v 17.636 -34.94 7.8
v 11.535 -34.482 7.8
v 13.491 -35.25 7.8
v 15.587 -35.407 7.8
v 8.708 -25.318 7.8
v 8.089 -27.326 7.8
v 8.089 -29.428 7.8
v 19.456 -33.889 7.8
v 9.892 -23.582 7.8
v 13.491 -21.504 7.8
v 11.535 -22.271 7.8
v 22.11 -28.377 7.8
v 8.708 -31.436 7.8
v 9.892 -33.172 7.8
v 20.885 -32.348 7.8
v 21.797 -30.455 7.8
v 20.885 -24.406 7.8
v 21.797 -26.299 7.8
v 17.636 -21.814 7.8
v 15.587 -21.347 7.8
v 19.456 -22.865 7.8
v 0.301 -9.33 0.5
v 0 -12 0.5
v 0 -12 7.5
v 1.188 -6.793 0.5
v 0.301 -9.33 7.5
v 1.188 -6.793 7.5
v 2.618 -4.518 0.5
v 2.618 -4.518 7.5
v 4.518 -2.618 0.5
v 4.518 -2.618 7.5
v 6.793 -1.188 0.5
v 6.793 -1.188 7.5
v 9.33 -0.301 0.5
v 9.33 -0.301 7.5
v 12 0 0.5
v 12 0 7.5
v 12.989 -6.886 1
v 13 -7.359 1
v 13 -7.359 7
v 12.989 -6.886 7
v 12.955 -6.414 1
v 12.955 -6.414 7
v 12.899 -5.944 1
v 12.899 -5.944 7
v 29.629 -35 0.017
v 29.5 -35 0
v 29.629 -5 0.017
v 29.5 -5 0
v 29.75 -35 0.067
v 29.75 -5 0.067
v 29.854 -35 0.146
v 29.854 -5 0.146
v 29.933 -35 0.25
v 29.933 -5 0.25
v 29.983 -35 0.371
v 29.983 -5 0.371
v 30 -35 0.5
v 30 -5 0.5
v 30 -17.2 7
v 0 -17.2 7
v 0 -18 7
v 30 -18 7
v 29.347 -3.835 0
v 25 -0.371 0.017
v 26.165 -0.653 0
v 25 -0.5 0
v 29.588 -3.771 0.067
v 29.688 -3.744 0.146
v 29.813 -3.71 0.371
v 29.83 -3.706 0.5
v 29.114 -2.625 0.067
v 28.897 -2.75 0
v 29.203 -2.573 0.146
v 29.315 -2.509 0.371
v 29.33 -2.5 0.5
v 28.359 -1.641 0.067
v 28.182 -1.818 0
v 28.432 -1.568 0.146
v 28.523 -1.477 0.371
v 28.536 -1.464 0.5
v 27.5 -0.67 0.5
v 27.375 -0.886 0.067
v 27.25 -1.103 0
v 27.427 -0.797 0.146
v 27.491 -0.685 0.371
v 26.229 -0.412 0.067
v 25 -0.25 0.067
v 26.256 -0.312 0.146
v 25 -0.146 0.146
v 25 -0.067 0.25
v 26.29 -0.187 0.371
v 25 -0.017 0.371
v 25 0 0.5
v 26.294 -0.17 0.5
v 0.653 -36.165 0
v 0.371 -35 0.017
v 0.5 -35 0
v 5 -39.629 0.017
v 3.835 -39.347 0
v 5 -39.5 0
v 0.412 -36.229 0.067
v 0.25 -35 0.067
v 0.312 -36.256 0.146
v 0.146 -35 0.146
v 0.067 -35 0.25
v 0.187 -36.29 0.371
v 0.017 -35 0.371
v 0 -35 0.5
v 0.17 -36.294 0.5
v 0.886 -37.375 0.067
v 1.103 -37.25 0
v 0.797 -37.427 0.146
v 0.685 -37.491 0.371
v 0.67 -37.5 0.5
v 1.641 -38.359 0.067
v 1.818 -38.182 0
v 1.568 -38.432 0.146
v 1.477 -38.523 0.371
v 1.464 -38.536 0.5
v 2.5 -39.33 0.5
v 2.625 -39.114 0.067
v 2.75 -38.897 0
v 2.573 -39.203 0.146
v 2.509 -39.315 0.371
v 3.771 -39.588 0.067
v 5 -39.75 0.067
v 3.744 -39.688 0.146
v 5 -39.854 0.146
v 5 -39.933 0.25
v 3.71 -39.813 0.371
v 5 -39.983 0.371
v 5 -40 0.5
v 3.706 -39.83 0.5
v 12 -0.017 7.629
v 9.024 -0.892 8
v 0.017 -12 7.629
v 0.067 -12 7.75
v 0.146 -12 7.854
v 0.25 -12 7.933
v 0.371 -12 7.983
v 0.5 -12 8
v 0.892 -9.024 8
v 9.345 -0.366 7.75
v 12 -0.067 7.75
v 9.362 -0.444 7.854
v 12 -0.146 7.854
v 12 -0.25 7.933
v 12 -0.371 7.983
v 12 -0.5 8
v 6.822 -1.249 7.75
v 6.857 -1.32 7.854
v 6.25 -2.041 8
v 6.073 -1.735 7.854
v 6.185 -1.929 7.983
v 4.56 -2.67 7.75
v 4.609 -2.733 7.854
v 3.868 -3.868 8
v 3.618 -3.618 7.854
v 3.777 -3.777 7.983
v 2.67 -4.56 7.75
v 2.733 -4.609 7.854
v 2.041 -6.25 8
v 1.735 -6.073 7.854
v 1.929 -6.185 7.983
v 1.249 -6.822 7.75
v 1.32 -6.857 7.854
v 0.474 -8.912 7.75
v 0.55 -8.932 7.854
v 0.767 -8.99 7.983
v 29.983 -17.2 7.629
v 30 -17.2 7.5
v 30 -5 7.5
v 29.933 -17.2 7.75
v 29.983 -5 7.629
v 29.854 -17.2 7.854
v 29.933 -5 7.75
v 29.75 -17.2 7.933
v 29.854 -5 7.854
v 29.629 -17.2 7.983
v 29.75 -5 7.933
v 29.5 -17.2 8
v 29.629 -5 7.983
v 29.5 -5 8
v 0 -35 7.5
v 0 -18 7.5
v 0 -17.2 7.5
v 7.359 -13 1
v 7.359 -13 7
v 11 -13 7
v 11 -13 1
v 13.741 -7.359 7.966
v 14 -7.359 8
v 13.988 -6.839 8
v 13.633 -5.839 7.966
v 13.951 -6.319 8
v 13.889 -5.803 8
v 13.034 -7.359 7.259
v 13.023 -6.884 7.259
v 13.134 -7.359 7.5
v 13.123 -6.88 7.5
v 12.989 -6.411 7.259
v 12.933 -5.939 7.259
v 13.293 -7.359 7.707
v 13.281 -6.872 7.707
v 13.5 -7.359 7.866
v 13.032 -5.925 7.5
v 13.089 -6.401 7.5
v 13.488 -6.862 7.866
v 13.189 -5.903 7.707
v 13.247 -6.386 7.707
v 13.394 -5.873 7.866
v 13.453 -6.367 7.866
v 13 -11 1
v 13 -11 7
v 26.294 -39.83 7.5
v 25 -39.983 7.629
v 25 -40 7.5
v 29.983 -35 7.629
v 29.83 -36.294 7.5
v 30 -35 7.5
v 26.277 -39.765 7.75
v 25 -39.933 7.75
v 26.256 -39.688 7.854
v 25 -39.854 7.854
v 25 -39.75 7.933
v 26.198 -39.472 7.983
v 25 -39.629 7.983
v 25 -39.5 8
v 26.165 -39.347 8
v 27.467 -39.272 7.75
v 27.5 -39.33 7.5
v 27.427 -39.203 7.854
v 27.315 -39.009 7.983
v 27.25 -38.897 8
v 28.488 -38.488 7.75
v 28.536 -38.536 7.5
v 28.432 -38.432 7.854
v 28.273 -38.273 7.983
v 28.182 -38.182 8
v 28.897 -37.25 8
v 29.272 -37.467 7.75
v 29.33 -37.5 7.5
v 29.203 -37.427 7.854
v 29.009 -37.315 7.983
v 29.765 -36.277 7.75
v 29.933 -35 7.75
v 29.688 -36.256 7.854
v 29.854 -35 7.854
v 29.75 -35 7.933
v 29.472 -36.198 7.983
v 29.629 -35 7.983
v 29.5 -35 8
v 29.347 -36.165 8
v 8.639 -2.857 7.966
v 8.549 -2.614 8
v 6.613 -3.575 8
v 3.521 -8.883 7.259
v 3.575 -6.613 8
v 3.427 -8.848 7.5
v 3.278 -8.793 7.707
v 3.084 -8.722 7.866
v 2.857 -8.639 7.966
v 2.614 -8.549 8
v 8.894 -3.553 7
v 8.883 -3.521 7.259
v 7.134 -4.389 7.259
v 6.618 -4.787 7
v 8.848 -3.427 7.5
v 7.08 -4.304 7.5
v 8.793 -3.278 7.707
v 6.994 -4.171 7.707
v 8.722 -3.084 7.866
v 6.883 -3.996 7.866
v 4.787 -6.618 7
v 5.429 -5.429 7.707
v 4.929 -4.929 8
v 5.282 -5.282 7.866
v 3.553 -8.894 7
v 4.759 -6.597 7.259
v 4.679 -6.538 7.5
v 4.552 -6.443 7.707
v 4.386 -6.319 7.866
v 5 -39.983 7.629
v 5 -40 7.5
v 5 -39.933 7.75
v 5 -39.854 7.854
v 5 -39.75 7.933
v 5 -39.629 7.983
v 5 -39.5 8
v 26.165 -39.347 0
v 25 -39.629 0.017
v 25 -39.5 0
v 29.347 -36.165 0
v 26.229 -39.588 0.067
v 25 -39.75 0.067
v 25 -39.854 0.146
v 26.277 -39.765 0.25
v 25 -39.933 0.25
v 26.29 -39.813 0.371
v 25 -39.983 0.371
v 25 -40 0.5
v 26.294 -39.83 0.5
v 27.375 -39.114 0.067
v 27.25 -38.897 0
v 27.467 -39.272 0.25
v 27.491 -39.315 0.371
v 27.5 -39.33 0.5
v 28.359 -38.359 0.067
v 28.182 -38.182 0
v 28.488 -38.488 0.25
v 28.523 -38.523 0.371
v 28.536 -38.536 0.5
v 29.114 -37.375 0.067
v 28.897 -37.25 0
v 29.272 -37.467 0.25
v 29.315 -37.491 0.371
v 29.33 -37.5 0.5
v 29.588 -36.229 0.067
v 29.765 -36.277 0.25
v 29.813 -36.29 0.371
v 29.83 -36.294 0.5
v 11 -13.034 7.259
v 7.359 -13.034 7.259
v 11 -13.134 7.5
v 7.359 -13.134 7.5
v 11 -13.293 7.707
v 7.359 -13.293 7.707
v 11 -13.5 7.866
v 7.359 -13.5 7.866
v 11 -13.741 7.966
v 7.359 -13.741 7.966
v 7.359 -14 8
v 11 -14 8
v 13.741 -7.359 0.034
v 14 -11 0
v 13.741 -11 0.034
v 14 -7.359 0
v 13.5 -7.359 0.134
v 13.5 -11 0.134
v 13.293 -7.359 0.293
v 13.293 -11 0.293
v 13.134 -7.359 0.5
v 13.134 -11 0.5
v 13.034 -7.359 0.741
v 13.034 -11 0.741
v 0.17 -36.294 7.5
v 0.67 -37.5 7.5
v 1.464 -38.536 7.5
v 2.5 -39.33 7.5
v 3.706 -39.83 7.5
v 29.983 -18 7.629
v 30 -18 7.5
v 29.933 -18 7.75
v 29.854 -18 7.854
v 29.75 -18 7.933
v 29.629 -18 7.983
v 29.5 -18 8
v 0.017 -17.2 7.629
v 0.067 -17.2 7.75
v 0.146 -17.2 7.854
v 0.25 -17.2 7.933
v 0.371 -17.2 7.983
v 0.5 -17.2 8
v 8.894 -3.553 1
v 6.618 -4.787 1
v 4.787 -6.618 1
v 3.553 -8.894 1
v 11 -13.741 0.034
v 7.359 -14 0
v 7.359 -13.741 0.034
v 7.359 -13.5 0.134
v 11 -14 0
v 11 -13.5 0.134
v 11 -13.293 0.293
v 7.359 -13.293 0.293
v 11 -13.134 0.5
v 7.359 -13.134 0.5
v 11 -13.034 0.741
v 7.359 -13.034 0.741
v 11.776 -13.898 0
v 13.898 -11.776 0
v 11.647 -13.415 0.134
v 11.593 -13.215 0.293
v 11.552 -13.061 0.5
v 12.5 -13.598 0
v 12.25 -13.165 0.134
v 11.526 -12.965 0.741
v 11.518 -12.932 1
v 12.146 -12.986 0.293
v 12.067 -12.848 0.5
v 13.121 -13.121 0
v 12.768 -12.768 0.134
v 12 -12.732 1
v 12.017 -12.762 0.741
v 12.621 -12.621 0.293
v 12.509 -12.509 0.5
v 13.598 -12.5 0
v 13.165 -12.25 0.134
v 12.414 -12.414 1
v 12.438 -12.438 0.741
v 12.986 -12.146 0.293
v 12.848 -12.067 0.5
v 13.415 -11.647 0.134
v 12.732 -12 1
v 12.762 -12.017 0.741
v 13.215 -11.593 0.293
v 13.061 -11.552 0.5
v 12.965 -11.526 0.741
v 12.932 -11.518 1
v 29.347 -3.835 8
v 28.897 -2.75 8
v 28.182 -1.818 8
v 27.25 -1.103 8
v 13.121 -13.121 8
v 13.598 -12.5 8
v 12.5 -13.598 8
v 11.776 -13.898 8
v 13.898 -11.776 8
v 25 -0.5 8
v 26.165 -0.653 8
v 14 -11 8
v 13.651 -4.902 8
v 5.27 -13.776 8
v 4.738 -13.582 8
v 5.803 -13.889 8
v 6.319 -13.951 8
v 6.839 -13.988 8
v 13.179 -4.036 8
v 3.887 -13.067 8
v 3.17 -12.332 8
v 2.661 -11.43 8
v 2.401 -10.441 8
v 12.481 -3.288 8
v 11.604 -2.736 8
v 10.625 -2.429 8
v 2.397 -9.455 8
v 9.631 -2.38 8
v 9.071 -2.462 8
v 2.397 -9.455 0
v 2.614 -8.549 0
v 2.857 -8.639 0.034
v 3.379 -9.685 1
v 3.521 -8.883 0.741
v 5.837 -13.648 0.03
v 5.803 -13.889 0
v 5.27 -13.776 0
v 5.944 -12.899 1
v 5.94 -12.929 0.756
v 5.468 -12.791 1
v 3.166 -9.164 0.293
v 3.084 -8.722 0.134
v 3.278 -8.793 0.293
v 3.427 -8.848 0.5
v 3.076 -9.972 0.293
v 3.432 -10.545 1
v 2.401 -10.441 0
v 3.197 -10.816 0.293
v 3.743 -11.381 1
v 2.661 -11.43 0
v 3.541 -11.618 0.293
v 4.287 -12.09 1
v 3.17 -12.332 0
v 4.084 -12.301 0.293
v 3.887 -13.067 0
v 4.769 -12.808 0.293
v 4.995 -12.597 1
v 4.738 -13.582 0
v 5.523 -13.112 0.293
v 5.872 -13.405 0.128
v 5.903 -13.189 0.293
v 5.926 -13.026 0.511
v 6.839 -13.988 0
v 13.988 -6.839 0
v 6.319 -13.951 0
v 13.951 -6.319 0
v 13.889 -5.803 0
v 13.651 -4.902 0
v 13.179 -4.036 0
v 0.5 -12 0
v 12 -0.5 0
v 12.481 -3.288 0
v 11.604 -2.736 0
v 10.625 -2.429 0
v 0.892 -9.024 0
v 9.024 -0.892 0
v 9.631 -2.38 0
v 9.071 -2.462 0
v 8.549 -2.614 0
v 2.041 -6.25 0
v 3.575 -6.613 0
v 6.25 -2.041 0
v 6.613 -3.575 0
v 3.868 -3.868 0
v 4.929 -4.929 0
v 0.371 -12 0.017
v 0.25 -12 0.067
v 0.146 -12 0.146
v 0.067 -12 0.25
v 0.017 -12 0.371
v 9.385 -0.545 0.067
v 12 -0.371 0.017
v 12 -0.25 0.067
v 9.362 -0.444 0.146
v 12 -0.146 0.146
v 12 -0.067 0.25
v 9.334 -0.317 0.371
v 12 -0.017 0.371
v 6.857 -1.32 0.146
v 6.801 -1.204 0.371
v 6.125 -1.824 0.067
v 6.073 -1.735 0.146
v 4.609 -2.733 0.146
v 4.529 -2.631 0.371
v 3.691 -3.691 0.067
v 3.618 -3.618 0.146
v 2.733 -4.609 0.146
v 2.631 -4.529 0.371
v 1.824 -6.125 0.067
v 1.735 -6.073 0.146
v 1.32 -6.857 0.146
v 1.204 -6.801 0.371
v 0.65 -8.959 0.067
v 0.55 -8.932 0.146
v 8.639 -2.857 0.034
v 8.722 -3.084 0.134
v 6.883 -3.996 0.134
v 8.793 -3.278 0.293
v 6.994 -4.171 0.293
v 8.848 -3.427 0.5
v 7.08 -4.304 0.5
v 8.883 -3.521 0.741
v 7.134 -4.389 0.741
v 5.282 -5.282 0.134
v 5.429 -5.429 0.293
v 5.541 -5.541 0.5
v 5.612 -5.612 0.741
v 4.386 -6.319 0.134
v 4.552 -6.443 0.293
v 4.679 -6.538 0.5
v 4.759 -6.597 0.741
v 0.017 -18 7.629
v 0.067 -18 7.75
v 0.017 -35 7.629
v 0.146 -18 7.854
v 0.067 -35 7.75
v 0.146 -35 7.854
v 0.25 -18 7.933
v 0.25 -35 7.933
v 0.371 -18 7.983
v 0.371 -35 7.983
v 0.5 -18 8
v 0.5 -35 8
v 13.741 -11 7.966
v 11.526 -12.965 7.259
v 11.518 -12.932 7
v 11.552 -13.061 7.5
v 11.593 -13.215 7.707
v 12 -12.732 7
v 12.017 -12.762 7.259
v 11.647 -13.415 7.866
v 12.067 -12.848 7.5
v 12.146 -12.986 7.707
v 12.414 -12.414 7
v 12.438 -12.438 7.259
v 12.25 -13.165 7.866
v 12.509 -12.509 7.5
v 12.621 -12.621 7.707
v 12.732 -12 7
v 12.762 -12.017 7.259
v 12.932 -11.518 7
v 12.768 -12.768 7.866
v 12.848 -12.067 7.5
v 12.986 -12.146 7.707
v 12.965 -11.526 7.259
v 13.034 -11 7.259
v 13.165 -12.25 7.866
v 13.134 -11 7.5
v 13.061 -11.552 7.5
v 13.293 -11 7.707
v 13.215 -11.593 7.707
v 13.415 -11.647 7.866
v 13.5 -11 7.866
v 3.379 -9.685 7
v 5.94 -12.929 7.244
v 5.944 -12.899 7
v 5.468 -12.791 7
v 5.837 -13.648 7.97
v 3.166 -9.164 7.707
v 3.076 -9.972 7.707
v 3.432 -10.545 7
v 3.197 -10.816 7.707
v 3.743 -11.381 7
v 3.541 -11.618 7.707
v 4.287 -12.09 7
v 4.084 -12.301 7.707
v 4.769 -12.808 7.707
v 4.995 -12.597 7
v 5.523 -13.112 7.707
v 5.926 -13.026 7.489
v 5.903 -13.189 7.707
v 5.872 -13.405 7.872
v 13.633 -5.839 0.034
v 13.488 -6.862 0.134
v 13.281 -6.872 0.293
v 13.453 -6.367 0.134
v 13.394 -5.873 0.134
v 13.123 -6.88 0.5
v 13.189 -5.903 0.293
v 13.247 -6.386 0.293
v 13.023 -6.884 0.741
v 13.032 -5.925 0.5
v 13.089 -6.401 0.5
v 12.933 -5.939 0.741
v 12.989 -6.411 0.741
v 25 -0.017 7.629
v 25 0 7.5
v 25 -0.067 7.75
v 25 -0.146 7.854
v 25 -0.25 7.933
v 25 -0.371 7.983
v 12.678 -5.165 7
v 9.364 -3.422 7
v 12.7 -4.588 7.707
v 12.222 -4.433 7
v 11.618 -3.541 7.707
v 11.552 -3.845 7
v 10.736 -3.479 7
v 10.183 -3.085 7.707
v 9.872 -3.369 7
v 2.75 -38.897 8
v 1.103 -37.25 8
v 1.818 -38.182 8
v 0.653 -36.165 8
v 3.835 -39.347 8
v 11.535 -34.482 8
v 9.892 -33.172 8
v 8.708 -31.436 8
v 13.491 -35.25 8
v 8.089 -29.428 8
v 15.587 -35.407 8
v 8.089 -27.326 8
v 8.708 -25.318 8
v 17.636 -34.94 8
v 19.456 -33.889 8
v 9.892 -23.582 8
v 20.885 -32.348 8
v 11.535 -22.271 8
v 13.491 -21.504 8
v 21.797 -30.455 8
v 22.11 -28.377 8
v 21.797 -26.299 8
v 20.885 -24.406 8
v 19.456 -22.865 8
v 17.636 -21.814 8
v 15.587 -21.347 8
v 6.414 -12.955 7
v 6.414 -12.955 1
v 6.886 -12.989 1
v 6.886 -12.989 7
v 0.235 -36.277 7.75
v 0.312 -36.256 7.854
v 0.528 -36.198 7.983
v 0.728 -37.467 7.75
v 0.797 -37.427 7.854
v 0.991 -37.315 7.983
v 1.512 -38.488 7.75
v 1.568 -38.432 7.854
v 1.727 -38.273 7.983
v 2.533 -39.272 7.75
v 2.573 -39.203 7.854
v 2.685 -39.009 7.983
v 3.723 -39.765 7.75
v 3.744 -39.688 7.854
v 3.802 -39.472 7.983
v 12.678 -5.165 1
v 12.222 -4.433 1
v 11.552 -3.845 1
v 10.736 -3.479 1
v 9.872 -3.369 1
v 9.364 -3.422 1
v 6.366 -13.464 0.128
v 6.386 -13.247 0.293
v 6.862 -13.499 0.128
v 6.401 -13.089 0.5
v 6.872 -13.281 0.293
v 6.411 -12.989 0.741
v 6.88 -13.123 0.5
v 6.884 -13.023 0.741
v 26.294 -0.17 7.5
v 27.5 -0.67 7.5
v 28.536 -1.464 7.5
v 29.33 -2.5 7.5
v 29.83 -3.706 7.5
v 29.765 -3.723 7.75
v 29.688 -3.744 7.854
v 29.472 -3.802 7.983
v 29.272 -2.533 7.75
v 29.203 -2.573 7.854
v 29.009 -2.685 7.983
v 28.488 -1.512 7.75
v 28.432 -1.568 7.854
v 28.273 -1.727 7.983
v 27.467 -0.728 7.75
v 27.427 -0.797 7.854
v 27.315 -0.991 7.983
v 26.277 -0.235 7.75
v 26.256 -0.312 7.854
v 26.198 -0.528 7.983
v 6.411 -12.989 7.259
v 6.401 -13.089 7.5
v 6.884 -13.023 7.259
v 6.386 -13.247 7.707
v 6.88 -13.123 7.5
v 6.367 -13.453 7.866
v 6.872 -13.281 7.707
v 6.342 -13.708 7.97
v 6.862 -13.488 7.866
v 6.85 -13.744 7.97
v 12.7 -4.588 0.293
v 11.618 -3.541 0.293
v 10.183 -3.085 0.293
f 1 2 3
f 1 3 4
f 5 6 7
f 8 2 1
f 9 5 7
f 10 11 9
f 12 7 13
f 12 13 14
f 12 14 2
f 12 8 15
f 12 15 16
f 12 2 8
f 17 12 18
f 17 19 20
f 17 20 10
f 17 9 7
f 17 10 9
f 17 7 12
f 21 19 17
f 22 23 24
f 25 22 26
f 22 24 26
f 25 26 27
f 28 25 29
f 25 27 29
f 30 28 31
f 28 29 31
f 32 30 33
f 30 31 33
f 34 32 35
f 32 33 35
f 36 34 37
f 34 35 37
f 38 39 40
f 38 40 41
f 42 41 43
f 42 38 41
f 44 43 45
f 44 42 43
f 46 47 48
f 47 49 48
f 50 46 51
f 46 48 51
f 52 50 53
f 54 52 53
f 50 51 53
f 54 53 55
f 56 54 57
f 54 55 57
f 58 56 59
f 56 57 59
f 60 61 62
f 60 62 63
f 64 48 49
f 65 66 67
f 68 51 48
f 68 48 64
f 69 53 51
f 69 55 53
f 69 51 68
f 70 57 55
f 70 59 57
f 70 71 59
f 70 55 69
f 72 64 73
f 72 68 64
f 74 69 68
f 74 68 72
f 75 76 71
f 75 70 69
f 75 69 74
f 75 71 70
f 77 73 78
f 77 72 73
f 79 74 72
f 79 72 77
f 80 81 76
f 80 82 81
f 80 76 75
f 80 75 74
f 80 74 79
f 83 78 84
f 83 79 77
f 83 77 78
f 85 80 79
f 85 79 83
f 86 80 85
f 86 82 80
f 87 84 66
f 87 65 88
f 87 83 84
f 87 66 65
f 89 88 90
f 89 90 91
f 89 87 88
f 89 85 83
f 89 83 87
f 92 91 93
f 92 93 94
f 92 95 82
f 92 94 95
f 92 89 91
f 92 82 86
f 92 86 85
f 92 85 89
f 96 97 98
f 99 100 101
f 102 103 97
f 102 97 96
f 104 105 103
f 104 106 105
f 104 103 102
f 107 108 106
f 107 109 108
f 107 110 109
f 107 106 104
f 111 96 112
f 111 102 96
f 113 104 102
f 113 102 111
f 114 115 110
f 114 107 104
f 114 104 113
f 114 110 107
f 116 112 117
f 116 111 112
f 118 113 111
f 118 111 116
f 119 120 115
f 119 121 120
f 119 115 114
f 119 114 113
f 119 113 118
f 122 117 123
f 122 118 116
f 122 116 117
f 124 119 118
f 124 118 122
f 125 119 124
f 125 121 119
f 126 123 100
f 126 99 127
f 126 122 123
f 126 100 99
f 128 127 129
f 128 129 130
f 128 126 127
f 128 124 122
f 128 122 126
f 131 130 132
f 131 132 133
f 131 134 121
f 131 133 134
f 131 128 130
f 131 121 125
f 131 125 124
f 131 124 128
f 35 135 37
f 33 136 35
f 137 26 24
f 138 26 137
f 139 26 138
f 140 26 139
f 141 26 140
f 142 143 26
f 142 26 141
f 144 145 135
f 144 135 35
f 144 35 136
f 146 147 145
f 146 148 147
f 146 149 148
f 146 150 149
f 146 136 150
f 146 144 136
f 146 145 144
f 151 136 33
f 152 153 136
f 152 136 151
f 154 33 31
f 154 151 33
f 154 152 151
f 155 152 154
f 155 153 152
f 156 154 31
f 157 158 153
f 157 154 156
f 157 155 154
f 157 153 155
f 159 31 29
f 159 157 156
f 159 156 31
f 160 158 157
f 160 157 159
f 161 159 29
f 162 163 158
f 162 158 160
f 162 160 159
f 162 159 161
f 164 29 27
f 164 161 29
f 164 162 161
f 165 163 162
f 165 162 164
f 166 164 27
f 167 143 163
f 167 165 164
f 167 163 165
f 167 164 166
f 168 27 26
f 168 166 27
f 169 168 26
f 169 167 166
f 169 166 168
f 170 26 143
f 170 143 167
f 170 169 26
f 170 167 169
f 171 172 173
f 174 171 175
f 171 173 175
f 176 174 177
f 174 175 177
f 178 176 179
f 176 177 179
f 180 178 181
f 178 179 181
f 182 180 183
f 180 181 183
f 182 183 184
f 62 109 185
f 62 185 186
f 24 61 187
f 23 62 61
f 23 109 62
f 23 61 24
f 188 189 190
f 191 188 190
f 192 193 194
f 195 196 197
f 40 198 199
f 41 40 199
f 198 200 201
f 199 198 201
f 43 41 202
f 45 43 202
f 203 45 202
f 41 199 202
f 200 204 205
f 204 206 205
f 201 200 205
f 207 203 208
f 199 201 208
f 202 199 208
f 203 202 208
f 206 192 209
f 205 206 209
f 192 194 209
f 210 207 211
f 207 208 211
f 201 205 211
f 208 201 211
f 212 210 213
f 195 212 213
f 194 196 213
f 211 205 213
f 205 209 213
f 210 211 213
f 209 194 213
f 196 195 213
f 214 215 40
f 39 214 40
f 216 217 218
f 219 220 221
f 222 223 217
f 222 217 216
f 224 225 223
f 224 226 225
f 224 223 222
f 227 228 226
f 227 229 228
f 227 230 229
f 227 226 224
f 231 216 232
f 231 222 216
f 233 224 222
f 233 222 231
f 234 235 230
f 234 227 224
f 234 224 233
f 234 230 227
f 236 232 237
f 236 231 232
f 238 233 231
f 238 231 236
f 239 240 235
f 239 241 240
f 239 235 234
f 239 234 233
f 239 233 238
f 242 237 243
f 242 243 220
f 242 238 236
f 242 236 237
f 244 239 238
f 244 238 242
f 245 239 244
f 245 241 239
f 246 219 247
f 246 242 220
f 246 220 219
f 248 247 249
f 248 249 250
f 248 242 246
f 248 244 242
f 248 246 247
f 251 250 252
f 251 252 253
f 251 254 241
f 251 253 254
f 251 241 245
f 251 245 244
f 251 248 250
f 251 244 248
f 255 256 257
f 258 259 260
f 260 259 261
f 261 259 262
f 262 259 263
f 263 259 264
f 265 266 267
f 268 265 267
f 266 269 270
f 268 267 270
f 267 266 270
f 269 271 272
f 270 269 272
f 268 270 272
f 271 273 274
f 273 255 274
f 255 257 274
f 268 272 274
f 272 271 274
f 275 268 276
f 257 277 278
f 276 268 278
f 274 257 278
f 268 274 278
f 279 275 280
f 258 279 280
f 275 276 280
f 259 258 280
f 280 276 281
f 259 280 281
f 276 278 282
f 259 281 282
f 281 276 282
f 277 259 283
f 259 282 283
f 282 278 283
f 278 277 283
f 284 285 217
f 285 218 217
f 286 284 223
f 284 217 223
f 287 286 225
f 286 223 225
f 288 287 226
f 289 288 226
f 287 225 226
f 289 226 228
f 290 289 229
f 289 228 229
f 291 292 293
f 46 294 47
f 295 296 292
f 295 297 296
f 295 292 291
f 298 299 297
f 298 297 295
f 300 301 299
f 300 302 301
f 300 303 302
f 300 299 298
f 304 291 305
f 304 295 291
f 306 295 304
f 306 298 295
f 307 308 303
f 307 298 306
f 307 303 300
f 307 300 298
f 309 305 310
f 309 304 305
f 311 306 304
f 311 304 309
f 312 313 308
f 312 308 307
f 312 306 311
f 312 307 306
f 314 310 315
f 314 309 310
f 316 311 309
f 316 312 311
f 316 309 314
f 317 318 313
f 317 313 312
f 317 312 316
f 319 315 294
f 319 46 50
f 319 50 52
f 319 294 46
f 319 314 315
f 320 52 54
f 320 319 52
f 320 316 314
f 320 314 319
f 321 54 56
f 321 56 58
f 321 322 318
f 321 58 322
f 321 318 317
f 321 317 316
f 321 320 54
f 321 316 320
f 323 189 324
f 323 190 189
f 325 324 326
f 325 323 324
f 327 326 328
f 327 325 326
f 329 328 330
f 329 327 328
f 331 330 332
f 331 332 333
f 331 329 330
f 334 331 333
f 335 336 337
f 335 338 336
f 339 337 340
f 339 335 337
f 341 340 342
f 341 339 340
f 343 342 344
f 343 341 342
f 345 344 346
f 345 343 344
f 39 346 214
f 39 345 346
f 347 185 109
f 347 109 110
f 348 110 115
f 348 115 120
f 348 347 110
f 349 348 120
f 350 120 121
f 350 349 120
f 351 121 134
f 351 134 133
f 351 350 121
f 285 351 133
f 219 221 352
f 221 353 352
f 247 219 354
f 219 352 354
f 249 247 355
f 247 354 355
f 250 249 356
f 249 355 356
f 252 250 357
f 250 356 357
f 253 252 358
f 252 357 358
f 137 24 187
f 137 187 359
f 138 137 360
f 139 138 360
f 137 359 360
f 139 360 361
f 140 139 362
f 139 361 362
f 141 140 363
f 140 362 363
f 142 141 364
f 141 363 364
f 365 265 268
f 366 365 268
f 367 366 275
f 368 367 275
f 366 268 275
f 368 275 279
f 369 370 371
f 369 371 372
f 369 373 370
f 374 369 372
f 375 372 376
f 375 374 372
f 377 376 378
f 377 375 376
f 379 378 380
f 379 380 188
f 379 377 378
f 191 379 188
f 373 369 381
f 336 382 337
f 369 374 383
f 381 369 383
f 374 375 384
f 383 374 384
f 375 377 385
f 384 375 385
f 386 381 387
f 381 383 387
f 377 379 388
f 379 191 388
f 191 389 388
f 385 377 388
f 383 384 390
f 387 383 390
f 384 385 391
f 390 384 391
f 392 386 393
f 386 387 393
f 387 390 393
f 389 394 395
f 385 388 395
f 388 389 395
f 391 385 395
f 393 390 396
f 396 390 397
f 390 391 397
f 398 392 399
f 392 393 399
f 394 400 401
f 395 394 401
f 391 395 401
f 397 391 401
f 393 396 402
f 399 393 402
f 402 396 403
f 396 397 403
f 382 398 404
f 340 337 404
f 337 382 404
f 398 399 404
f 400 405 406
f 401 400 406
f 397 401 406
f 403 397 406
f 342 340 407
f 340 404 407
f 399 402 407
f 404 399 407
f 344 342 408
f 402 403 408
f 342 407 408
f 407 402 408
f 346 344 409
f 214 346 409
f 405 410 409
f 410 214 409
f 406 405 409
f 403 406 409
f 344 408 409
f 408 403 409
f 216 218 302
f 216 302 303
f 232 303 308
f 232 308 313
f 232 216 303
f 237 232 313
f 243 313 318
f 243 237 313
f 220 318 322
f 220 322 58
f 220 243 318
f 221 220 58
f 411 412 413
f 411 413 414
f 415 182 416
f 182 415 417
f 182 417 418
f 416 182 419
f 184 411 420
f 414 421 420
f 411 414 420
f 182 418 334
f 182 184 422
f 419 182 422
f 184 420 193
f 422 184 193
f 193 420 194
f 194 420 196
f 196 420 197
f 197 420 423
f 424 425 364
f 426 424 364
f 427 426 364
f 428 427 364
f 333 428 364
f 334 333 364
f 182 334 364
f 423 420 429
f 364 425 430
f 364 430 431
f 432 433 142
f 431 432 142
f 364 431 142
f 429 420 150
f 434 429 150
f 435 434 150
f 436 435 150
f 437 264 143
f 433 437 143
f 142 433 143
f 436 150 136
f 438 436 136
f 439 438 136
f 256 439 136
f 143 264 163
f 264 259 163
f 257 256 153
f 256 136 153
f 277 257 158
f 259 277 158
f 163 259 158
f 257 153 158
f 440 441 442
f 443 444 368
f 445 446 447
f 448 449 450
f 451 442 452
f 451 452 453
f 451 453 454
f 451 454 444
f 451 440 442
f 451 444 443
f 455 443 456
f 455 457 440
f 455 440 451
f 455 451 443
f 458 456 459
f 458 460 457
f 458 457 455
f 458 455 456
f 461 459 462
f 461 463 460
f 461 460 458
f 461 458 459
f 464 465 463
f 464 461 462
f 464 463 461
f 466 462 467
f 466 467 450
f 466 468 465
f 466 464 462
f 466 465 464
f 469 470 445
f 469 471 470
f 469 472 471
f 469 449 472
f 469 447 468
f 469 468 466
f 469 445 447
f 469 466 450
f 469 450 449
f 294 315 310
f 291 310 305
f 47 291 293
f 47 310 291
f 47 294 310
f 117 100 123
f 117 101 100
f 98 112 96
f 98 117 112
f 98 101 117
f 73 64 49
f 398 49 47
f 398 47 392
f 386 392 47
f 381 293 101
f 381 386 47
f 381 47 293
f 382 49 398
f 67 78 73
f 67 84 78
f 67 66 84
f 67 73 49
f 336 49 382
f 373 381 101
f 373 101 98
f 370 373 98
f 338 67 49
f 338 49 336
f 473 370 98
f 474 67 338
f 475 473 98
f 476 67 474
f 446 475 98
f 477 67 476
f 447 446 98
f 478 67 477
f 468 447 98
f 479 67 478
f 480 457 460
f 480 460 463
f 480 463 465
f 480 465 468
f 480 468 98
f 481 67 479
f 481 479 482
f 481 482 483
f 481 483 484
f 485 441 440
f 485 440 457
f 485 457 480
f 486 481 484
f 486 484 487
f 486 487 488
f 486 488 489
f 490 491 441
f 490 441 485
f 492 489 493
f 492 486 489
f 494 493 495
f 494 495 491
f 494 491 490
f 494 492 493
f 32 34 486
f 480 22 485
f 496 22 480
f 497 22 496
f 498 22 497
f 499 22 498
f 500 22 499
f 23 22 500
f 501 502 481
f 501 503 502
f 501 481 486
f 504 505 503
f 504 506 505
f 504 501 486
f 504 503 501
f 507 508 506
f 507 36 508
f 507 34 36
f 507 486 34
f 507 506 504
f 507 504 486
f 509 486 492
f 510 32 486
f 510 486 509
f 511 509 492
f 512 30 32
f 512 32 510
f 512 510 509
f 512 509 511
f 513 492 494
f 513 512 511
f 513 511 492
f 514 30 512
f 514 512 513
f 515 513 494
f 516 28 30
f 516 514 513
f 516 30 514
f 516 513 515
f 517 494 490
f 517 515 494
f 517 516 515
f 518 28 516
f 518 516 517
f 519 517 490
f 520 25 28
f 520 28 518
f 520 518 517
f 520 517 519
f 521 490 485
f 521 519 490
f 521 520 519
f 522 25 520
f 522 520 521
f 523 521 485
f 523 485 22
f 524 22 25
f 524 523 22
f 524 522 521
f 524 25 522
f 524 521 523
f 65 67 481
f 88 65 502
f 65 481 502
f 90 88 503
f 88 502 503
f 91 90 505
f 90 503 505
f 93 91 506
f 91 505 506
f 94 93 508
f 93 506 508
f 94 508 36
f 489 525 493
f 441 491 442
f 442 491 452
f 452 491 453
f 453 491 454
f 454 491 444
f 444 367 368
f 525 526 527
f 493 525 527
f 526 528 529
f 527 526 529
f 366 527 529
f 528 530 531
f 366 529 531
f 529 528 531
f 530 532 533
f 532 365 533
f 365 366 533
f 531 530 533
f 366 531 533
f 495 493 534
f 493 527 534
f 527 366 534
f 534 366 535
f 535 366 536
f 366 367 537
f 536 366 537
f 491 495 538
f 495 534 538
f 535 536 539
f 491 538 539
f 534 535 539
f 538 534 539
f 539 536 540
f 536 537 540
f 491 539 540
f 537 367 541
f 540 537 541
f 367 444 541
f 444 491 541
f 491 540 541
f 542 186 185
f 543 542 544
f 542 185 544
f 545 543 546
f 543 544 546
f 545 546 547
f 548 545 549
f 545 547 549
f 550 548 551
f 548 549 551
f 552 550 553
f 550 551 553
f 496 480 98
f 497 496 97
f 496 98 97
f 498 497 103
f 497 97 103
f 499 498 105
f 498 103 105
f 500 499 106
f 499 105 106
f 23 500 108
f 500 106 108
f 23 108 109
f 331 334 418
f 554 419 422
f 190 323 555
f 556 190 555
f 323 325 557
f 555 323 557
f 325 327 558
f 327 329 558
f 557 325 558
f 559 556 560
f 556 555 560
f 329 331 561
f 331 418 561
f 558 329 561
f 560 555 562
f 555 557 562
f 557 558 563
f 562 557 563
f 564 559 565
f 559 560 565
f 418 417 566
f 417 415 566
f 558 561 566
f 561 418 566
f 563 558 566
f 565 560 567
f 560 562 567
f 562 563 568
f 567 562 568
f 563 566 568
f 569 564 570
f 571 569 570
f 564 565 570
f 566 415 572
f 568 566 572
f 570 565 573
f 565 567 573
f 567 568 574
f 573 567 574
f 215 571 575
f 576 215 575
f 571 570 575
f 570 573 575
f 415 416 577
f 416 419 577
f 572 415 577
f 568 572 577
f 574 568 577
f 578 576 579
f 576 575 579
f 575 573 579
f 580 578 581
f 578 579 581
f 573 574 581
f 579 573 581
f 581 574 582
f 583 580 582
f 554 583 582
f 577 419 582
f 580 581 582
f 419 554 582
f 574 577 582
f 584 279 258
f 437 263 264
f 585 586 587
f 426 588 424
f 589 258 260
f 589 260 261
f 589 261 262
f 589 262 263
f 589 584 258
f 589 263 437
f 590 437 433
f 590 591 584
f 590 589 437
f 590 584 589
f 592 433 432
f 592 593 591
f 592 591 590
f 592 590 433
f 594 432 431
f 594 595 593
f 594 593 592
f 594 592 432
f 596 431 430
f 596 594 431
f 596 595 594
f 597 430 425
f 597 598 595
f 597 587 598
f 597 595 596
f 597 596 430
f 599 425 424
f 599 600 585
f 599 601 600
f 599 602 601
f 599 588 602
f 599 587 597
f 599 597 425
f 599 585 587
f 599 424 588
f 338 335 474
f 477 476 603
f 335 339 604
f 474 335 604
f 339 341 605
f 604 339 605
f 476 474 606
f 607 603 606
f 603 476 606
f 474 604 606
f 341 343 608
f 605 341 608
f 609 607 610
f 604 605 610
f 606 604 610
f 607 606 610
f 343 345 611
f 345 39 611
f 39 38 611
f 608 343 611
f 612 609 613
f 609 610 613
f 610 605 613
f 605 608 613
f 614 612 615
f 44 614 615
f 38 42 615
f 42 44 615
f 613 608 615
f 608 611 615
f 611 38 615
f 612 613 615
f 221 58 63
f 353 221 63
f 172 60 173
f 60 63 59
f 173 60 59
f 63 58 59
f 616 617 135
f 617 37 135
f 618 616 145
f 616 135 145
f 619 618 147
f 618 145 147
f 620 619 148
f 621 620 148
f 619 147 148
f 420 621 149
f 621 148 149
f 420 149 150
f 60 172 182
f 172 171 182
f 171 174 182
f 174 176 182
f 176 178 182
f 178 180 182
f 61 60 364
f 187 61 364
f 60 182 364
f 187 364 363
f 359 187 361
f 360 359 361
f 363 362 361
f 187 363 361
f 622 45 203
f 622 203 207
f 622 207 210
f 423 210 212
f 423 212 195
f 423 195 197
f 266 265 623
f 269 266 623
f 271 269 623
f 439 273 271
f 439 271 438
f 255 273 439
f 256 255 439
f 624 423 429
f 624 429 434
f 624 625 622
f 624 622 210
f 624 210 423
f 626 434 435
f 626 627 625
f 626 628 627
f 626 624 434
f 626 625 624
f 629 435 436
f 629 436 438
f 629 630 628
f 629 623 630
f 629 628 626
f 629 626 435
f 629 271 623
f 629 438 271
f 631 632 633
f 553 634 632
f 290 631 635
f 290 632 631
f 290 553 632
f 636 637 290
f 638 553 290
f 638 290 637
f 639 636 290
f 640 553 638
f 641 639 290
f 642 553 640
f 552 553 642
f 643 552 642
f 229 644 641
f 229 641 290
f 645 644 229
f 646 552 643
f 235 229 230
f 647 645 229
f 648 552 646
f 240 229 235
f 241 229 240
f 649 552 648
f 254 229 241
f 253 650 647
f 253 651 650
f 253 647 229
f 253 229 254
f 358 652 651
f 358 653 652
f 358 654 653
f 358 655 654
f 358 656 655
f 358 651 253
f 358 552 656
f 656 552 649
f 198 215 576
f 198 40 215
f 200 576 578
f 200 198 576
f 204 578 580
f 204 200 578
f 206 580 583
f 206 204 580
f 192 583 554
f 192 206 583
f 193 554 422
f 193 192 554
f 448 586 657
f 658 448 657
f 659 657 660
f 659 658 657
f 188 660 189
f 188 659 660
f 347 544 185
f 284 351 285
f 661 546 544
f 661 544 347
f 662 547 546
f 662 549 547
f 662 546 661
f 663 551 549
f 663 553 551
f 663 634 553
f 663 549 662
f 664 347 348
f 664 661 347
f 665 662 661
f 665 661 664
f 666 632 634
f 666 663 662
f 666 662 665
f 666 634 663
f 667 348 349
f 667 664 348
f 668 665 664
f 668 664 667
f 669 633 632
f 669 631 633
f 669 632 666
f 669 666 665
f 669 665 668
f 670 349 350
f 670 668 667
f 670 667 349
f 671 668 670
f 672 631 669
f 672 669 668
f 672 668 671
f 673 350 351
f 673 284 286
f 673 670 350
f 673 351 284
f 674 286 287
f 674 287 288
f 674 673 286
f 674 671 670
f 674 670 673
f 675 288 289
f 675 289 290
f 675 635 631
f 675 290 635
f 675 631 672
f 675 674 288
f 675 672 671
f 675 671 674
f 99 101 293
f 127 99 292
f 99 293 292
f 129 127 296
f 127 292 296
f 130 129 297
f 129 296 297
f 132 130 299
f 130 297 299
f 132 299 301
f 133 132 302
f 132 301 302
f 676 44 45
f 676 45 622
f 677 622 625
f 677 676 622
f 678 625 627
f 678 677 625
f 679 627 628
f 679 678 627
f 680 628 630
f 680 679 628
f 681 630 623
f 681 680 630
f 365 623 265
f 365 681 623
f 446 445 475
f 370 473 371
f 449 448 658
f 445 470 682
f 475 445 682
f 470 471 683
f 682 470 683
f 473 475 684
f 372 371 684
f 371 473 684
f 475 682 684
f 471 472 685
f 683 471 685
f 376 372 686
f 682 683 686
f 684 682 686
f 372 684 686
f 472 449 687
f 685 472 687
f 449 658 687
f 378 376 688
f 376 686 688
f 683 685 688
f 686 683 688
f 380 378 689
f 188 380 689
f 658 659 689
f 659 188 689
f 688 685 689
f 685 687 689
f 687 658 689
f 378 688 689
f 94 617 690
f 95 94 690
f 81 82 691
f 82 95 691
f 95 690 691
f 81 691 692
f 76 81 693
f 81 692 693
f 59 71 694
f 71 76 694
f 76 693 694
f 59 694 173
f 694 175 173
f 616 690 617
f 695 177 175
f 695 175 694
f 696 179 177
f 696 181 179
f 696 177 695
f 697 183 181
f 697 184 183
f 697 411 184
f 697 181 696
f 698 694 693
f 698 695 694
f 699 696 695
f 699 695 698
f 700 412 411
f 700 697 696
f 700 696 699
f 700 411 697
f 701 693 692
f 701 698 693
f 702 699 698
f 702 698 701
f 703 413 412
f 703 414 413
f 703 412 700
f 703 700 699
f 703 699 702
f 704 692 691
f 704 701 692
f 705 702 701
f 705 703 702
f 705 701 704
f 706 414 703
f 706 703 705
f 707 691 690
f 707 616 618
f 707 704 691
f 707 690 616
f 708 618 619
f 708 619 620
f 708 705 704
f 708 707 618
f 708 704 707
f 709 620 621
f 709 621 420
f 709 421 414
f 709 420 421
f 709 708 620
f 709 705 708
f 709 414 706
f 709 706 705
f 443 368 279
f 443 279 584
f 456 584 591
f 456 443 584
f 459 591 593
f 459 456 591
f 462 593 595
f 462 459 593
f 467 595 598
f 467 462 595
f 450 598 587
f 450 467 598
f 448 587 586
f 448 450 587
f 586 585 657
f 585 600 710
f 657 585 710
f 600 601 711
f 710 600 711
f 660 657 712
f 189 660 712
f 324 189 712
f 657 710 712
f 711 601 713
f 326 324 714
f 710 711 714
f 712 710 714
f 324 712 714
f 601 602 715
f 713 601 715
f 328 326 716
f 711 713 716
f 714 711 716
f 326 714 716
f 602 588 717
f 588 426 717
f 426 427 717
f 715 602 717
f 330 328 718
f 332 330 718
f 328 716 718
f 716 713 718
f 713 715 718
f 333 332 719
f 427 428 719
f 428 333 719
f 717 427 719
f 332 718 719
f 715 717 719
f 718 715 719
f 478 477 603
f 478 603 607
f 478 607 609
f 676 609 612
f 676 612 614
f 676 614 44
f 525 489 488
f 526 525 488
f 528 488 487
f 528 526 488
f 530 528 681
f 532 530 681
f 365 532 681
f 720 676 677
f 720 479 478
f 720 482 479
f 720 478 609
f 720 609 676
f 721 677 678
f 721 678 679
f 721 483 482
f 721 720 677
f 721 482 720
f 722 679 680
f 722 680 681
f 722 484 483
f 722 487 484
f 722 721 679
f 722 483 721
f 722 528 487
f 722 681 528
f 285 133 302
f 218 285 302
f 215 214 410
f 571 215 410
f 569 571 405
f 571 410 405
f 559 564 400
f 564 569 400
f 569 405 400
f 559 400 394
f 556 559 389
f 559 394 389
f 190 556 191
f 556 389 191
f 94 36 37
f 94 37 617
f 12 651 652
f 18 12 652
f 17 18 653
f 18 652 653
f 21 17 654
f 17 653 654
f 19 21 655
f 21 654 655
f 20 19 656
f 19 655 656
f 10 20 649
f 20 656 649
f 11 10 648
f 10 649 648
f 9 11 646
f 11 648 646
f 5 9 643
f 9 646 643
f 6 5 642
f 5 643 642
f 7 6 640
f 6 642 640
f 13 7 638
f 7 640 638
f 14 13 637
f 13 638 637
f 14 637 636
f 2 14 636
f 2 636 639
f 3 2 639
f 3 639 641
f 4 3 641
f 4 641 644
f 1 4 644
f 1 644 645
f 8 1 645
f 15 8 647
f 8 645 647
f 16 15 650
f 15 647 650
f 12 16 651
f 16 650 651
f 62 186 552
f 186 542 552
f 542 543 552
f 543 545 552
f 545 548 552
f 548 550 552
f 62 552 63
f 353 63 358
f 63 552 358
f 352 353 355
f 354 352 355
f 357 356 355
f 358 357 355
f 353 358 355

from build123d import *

# Parameters (mm, degrees)
F0_W        = 30
F0_H        = 40
F1_DEPTH    = 8
F2_R        = 12
F3_R        = 5
F5_DEPTH    = 25
F4_W        = 26.9999996879
F4_H        = 0.8
F4_W_2      = 3.0000003121
F6_DEPTH    = 1
F7_T1_DEPTH = 8
F8_R        = 3
F9_R        = 2
F10_R       = 0.5
F11_R       = 1
F12_R       = 7.0500114294
F13_DEPTH   = 0.2


# Not quite as in the source:
# - a fillet or chamfer that OpenCascade refuses, or shapes differently, is made with other operations: its cross-section is extruded or revolved along the edge and cut away or added


with BuildPart() as f1:
    # F0 (on Top) → F1 (new body)
    with BuildSketch(Plane.XY):
        with Locations((15, -20)):
            Rectangle(F0_W, F0_H)
    extrude(amount=F1_DEPTH)

    # F2
    f2_edges = [f1.edges().sort_by_distance(p)[0] for p in [
        (0, 0, 4),
    ]]
    fillet(f2_edges, radius=F2_R)

    # F3
    f3_edges = [f1.edges().sort_by_distance(p)[0] for p in [
        (30, 0, 4),
        (30, -40, 4),
        (0, -40, 4),
    ]]
    fillet(f3_edges, radius=F3_R)

    # F4 (on face) → F5 (cut)
    with BuildSketch(Plane.XY.offset(8)):
        with BuildLine():
            Line((3.0000003121, -12), (3.0000003121, -13.0000003121))
            Line((3.0000003121, -13.0000003121), (13.0000003121, -13.0000003121))
            Line((13.0000003121, -13.0000003121), (13.0000003121, -3.0000003121))
            Line((13.0000003121, -3.0000003121), (12, -3.0000003121))
            ThreePointArc((12, -3.0000003121), (5.63603919, -5.63603919), (3.0000003121, -12))
        make_face()
    extrude(amount=-F5_DEPTH, mode=Mode.SUBTRACT)

    # F4 (on face) → F6 (cut)
    with BuildSketch(Plane.XY.offset(8)):
        with Locations((16.500000156, -17.6)):
            Rectangle(F4_W, F4_H)
        with Locations((1.500000156, -17.6)):
            Rectangle(F4_W_2, F4_H)
    extrude(amount=-F6_DEPTH, mode=Mode.SUBTRACT)

    # F7: fillet of radius 10 on 2 edges, made by hand

    # F7_s2 → F7_t1 (join)
    with BuildSketch(Plane.XY):
        with BuildLine():
            ThreePointArc((13.0000003121, -7.3588999), (12.7467945768, -5.1228315736), (12, -3.0000003121))
            Line((12, -3.0000003121), (13.0000003121, -3.0000003121))
            Line((13.0000003121, -3.0000003121), (13.0000003121, -7.3588999))
        make_face()
        with BuildLine():
            ThreePointArc((3.0000003121, -12), (5.1228315736, -12.7467945768), (7.3588999, -13.0000003121))
            Line((7.3588999, -13.0000003121), (3.0000003121, -13.0000003121))
            Line((3.0000003121, -13.0000003121), (3.0000003121, -12))
        make_face()
    extrude(amount=F7_T1_DEPTH)

    # F8
    f8_edges = [f1.edges().sort_by_distance(p)[0] for p in [
        (12, -3, 4),
        (3, -12, 4),
    ]]
    fillet(f8_edges, radius=F8_R)

    # F9
    f9_edges = [f1.edges().sort_by_distance(p)[0] for p in [
        (13, -13, 4),
    ]]
    fillet(f9_edges, radius=F9_R)

    # F10
    f10_edges = [f1.edges().sort_by_distance(p)[0] for p in [
        (30, -11.1, 8),
        (30, -26.5, 8),
        (30, -20, 0),
        (18.5, 0, 0),
        (3.514719, -3.514719, 0),
        (0, -23.5, 0),
        (1.464466, -38.535534, 0),
        (15, -40, 0),
        (28.535534, -38.535534, 0),
        (28.535534, -1.464466, 0),
        (18.5, 0, 8),
        (3.514719, -3.514719, 8),
        (0, -26.5, 8),
        (0, -14.6, 8),
        (1.464466, -38.535534, 8),
        (15, -40, 8),
        (28.535534, -38.535534, 8),
        (28.535534, -1.464466, 8),
    ]]
    fillet(f10_edges, radius=F10_R)

    # F11
    f11_edges = [f1.edges().sort_by_distance(p)[0] for p in [
        (5.636039, -5.636039, 8),
        (11.467525, -3.792736, 0),
        (9.17945, -13, 0),
        (12.414214, -12.414214, 0),
        (6.649711, -12.974821, 0),
        (13, -9.17945, 0),
        (3.792736, -11.467525, 0),
        (12.974821, -6.649711, 0),
        (5.636039, -5.636039, 0),
        (9.17945, -13, 8),
        (12.414214, -12.414214, 8),
        (6.649711, -12.974821, 8),
        (13, -9.17945, 8),
        (3.792736, -11.467525, 8),
        (12.974821, -6.649711, 8),
        (11.467525, -3.792736, 8),
    ]]
    fillet(f11_edges, radius=F11_R)

    # F12 (on face) → F13 (cut)
    with BuildSketch(Plane.XY.offset(8)):
        with Locations((15.0601761416, -28.3769778907)):
            Circle(F12_R)
    extrude(amount=-F13_DEPTH, mode=Mode.SUBTRACT)


solid = f1.part
